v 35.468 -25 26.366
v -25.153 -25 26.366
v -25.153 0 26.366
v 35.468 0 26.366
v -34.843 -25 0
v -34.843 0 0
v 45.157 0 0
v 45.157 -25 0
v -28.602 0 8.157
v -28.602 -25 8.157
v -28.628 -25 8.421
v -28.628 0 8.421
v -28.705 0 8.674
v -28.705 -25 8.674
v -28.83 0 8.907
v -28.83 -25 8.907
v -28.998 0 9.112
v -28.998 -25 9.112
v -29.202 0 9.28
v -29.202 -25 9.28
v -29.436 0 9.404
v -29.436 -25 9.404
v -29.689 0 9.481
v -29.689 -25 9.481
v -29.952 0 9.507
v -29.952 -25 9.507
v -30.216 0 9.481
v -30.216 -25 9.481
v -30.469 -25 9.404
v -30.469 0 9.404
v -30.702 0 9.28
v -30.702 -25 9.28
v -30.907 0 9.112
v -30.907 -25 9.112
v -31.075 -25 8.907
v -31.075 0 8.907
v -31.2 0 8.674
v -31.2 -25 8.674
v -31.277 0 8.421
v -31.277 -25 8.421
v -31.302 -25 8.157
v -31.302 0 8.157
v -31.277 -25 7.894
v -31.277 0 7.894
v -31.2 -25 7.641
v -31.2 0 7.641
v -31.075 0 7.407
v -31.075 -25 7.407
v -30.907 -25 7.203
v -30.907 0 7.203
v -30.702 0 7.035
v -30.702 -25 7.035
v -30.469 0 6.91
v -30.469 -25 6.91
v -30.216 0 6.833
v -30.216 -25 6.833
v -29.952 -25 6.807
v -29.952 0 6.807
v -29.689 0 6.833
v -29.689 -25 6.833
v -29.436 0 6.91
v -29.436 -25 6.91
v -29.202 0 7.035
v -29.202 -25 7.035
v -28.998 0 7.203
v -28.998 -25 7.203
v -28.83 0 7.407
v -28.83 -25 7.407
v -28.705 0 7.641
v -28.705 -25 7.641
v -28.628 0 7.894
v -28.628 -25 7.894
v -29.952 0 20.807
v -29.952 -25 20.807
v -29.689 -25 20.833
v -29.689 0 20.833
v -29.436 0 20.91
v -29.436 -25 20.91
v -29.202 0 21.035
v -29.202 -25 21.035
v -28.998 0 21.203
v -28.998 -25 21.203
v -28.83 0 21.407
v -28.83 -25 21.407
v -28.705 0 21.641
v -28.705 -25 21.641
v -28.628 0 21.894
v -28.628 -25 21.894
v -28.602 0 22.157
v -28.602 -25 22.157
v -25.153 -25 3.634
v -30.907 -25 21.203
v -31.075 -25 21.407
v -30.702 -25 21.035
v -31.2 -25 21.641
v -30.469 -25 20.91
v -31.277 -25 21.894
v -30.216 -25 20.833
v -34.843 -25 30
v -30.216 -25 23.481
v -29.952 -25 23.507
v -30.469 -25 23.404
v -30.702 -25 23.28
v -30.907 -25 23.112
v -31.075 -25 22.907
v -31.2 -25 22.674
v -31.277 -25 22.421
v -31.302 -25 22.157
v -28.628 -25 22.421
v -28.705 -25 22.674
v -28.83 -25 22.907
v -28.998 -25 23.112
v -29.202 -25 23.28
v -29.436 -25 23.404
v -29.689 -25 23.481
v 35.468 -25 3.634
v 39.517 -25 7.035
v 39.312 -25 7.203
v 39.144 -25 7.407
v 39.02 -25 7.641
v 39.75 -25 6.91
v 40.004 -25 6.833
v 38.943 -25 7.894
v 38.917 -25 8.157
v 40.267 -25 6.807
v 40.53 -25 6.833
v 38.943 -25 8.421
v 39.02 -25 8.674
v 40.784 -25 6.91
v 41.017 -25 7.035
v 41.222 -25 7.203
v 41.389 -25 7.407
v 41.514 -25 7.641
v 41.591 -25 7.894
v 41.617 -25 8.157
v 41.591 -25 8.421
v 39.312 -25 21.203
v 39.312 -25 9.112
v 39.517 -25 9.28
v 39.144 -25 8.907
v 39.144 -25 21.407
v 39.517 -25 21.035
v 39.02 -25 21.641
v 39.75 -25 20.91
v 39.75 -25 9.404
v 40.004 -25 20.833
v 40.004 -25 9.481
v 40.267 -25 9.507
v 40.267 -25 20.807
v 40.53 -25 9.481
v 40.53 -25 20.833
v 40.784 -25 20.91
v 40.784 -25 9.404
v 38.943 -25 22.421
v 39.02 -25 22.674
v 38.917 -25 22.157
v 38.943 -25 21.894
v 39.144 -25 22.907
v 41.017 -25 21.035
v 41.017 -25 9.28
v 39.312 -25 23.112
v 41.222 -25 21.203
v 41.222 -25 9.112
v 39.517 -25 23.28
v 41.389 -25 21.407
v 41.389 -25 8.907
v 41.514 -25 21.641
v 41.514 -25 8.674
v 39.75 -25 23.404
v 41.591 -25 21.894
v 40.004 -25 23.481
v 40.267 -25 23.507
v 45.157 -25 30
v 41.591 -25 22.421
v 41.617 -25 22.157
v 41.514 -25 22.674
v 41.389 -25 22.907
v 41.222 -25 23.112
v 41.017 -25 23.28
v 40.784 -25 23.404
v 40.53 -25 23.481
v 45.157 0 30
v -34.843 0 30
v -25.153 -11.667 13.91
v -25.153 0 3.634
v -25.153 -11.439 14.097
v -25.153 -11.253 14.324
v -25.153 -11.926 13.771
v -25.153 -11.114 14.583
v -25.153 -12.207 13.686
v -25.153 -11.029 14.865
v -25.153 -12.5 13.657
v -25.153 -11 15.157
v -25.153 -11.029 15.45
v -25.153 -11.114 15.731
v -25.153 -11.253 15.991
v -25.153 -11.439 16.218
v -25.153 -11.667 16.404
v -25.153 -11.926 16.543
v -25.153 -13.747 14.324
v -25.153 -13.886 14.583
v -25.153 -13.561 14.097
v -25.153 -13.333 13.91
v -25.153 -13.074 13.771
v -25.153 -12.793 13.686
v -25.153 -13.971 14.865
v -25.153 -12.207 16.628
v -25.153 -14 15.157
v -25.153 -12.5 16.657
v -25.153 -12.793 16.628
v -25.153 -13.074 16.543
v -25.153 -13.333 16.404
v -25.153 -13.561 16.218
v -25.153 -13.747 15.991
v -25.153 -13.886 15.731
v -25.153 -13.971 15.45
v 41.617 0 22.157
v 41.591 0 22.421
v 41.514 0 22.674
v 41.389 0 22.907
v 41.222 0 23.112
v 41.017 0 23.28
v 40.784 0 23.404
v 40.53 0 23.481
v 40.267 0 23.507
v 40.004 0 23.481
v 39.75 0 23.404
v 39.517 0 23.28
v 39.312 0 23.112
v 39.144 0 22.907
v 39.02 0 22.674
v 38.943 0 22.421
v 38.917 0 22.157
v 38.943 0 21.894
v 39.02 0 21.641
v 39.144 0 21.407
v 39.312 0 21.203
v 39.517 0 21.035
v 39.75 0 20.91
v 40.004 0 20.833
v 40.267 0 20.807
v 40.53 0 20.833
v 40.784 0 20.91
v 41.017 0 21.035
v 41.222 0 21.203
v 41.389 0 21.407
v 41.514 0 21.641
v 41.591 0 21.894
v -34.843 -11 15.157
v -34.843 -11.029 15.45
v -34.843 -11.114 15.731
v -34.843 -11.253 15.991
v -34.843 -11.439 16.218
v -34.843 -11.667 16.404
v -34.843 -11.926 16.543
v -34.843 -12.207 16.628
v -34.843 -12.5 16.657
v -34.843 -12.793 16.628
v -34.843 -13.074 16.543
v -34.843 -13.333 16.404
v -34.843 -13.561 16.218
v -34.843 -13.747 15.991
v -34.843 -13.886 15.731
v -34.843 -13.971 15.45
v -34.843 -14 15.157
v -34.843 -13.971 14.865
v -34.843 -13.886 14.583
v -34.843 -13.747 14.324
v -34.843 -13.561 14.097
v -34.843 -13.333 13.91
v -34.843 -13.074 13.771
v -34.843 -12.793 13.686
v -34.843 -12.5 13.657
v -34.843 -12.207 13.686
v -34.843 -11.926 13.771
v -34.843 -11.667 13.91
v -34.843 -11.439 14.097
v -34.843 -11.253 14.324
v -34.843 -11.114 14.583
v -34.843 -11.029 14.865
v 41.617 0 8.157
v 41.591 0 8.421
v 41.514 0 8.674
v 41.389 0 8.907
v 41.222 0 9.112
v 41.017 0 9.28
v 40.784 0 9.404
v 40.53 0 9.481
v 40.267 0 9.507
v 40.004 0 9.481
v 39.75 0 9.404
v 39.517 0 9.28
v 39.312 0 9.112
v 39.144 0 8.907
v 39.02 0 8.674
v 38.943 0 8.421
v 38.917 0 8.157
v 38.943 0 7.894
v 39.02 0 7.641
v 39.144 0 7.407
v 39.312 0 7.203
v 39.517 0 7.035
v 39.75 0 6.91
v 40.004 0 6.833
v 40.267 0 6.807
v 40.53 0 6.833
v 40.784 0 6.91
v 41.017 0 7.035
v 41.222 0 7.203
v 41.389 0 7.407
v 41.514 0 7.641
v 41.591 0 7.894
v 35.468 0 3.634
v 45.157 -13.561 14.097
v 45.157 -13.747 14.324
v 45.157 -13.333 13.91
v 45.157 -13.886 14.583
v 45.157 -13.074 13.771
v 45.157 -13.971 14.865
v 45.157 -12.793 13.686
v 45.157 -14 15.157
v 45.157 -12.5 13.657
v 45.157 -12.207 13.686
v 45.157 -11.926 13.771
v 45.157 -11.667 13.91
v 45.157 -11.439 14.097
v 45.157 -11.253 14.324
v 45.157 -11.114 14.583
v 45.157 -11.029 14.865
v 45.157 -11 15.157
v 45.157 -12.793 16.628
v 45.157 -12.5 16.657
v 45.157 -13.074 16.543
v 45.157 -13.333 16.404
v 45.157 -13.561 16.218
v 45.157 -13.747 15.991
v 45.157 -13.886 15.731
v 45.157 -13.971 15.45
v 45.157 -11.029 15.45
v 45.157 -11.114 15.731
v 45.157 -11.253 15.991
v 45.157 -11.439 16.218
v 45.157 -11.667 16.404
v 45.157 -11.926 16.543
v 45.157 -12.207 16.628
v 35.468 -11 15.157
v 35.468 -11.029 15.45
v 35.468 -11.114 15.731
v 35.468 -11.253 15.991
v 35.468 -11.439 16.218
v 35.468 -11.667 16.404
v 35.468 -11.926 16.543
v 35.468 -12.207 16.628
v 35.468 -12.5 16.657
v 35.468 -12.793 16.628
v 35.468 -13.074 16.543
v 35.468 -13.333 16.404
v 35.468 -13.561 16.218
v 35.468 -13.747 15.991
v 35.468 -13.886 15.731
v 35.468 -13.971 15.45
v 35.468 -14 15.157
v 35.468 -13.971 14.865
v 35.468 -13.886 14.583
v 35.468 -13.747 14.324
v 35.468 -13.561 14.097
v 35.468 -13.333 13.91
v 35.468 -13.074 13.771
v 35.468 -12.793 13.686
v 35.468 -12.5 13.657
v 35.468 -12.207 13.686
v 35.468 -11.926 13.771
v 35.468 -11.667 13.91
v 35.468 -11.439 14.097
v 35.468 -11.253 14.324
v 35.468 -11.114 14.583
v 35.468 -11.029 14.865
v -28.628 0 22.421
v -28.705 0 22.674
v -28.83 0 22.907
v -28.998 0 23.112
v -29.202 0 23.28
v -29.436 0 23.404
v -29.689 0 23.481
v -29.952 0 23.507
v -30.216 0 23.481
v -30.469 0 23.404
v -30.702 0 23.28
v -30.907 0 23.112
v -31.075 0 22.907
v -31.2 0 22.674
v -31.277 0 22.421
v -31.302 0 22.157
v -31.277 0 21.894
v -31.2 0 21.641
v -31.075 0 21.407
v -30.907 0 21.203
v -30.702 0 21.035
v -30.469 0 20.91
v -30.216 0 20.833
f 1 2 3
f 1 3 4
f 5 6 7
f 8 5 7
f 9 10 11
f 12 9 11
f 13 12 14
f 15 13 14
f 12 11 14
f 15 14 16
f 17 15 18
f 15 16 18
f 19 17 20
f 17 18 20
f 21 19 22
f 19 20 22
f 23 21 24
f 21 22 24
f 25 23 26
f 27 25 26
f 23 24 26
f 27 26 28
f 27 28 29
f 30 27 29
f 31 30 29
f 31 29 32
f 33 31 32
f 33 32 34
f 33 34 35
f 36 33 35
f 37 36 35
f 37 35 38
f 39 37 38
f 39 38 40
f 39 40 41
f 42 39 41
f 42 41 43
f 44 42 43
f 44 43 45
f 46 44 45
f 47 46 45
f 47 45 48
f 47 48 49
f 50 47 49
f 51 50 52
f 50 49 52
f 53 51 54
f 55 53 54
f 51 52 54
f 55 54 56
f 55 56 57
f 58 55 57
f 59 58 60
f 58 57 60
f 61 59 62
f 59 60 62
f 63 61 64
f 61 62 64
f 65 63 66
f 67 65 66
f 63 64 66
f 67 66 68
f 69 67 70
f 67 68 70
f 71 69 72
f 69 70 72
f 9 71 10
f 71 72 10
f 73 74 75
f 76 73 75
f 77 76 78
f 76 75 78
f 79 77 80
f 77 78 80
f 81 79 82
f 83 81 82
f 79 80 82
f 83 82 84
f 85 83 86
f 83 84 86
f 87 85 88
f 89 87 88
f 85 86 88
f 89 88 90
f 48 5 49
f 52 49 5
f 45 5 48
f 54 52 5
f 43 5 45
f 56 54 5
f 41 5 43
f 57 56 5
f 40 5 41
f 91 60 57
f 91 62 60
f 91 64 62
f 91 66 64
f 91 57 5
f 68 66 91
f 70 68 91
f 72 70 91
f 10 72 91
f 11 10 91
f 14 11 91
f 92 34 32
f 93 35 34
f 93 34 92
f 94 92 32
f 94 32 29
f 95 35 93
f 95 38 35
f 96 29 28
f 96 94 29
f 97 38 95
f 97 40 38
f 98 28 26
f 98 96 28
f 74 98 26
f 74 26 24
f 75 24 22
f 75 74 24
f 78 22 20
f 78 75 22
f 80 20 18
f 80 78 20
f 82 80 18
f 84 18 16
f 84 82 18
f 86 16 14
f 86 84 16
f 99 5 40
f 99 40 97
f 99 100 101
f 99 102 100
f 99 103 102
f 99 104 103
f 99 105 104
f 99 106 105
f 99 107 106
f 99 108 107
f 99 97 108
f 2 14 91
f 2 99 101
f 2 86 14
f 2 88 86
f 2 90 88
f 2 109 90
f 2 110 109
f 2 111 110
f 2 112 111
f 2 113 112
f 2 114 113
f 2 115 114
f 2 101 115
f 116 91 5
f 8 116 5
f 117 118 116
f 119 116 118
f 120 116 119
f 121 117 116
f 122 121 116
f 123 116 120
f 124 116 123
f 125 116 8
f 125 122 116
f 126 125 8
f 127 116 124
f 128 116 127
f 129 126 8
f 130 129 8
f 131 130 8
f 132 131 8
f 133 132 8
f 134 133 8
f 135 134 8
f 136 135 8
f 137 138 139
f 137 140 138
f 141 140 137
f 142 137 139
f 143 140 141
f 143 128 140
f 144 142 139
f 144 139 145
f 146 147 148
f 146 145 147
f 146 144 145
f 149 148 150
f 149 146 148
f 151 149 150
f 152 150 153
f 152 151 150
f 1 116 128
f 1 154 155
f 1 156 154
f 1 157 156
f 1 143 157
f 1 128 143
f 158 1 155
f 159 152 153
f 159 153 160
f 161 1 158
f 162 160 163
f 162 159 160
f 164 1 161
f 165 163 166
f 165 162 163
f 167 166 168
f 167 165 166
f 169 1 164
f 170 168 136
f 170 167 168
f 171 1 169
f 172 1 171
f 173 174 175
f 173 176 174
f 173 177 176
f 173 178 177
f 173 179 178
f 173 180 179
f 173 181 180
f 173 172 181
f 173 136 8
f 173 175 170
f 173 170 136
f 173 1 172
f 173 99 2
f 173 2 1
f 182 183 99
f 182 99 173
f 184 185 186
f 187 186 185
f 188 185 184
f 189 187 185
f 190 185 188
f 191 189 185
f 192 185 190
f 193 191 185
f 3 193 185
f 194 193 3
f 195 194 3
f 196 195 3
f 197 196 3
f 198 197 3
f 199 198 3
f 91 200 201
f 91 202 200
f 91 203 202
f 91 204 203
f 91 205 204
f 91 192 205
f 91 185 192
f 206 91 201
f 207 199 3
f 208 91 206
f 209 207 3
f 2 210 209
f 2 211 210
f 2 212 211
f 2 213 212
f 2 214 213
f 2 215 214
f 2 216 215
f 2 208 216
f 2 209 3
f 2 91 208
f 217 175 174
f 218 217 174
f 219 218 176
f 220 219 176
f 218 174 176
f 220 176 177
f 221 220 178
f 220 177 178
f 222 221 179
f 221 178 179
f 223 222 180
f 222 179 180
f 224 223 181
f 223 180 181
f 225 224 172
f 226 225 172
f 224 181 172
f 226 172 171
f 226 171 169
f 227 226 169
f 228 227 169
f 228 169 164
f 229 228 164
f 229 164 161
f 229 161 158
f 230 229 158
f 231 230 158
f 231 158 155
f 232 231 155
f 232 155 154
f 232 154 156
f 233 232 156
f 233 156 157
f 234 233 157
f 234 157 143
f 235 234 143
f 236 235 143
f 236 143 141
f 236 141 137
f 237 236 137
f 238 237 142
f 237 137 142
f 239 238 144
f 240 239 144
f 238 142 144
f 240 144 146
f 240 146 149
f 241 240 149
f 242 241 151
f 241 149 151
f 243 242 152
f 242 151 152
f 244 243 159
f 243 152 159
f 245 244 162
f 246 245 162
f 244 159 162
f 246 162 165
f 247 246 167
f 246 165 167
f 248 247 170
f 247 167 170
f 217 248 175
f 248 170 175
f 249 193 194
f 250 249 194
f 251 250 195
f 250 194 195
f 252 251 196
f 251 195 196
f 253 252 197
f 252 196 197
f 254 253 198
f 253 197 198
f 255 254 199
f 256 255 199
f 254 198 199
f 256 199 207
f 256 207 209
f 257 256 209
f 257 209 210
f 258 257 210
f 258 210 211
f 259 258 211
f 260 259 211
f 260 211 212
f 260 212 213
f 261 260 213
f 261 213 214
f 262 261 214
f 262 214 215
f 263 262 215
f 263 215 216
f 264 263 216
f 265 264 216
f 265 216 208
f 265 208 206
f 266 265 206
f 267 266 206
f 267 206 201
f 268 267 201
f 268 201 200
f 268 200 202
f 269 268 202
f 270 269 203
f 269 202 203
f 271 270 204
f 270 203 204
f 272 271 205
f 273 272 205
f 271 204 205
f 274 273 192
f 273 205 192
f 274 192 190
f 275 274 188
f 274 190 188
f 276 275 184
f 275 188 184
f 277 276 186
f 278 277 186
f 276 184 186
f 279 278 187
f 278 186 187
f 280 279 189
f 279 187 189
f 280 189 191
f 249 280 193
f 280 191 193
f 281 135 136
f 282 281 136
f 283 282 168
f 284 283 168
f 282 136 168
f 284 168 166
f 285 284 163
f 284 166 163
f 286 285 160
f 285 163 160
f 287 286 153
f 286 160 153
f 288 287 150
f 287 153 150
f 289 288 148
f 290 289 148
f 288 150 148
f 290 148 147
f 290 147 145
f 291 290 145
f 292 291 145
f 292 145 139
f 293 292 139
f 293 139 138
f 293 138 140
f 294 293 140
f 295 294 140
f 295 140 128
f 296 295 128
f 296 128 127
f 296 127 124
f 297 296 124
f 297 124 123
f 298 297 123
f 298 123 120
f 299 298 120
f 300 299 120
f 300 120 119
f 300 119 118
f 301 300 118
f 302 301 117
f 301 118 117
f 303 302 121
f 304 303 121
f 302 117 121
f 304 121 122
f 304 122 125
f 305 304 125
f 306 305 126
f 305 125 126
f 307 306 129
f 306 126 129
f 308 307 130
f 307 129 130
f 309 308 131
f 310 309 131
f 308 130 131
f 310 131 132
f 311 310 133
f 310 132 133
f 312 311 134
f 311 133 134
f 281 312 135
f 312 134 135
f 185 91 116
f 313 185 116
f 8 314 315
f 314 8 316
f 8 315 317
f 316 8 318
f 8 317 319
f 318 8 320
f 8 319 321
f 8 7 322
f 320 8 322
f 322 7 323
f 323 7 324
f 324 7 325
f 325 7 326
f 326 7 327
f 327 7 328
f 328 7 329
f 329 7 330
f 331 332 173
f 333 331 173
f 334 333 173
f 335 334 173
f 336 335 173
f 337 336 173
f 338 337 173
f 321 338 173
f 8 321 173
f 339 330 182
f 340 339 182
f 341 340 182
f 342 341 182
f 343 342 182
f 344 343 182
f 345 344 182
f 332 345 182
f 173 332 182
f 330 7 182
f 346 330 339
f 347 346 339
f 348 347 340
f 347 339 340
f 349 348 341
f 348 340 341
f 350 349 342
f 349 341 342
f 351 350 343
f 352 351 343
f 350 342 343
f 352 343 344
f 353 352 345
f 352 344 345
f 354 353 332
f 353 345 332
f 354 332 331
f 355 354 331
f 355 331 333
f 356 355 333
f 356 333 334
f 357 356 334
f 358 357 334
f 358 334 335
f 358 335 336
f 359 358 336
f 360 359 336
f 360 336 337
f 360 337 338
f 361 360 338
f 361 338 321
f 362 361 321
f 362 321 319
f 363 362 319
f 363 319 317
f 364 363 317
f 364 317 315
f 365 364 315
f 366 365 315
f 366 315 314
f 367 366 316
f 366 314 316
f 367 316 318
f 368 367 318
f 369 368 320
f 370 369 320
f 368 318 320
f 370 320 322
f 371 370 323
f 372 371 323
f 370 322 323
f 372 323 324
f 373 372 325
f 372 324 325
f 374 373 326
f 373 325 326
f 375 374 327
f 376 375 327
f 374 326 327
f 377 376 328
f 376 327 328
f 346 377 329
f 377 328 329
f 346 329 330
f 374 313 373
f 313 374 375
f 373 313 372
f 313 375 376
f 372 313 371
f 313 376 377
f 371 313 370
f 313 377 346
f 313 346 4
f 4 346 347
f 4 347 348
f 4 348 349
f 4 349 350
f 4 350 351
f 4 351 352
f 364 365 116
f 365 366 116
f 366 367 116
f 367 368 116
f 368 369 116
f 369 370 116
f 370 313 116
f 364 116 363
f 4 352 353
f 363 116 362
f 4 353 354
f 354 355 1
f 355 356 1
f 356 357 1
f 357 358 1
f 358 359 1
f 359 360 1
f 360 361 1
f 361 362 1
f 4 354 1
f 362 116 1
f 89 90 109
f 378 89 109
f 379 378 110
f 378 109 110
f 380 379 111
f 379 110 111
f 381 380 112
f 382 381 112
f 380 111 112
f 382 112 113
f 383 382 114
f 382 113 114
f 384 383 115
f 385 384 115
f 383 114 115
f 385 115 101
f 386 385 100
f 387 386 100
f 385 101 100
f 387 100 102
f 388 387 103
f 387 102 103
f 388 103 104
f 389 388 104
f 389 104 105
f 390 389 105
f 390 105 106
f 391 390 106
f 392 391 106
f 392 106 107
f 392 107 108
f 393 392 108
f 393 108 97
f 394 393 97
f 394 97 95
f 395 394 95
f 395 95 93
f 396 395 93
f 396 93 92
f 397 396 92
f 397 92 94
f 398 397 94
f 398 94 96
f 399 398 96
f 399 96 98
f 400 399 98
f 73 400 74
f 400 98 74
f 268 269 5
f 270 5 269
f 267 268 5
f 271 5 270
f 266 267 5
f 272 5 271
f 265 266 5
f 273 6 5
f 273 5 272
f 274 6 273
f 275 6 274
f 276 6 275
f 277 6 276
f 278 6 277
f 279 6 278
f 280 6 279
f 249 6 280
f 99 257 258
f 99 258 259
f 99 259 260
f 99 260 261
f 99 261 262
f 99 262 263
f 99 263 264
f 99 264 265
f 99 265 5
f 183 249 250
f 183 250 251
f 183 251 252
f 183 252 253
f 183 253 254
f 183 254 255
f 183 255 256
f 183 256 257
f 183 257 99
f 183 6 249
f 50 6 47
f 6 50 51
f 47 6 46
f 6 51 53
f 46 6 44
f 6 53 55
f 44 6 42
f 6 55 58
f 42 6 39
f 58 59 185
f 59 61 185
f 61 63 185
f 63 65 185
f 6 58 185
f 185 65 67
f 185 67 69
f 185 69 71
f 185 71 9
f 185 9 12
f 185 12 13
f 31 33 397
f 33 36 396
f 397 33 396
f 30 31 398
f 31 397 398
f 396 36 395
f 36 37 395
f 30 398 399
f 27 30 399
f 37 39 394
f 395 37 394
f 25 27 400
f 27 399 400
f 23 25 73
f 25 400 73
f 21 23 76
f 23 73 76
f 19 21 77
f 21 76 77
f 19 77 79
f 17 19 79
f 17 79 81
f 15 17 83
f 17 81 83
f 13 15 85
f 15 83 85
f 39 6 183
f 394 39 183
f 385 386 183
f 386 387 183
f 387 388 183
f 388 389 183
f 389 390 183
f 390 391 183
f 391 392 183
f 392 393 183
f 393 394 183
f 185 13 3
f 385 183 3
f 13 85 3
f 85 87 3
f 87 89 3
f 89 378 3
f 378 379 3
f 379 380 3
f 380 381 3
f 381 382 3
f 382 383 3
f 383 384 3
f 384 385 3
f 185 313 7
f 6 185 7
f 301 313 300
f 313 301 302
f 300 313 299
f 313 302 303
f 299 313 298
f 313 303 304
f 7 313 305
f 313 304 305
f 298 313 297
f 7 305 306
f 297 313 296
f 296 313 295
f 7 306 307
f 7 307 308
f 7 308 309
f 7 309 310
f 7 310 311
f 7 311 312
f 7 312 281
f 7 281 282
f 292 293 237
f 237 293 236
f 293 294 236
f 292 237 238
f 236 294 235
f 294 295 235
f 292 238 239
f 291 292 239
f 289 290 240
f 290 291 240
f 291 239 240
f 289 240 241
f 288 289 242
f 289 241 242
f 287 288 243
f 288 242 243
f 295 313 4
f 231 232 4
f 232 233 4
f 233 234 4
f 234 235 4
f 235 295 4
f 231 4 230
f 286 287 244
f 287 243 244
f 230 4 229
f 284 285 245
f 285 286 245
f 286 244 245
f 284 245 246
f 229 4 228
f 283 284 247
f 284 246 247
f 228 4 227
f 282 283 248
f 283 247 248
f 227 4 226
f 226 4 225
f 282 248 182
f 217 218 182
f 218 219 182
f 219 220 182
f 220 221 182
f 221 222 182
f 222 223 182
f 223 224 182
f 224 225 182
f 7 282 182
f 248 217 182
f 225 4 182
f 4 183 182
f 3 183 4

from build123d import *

# Parameters (mm, degrees)
F0_W      = 80
F0_H      = 30
F1_DEPTH  = 25
F3_DEPTH  = 20
F4_R      = 1.5
F5_DEPTH  = 1000
F3_FACE_W = 60.621056
F3_FACE_H = 22.732896
F6_DEPTH  = 25
F7_R      = 1.35
F7_R_2    = 1
F8_DEPTH  = 100000


with BuildPart() as f1:
    # F0 (on Front) → F1 (new body)
    with BuildSketch(Plane.XZ):
        with Locations((5.157232, 15)):
            Rectangle(F0_W, F0_H)
    extrude(amount=F1_DEPTH)

    # F2 (on face) → F3 (cut)
    with BuildSketch(Plane.XZ.offset(25)):
        Polygon((35.46776, 26.366448), (-25.153296, 26.366448), (5.157232, 15), align=None)
        Polygon((5.157232, 15), (-25.153296, 26.366448), (-25.153296, 3.633552), align=None)
        Polygon((35.46776, 26.366448), (5.157232, 15), (35.46776, 3.633552), align=None)
        Polygon((35.46776, 3.633552), (5.157232, 15), (-25.153296, 3.633552), align=None)
    extrude(amount=-F3_DEPTH, mode=Mode.SUBTRACT)

    # F4 (on face) → F5 (cut)
    with BuildSketch(Plane.YZ.offset(45.157232)):
        with Locations((-12.5, 15.157233)):
            Circle(F4_R)
    extrude(amount=-F5_DEPTH, mode=Mode.SUBTRACT)

    # F3_face (on face) → F6 (cut)
    with BuildSketch(Plane(origin=(5.157232, -5, 15), x_dir=(1, 0, 0), z_dir=(0, -1, 0))):
        Rectangle(F3_FACE_W, F3_FACE_H)
    extrude(amount=-F6_DEPTH, mode=Mode.SUBTRACT)

    # F7 (on face) → F8 (cut)
    with BuildSketch(Plane.XZ.offset(25)):
        with BuildLine():
            ThreePointArc((-29.95245, 20.807233), (-28.997856, 21.202639), (-28.60245, 22.157233))
            ThreePointArc((-28.60245, 22.157233), (-30.907045, 23.111827), (-29.95245, 20.807233))
        make_face()
        with Locations((-29.95245, 8.157233)):
            Circle(F7_R)
        with Locations((40.266914, 8.157233)):
            Circle(F7_R)
        with Locations((40.266914, 22.157233)):
            Circle(F7_R)
        with Locations((-12.661189, -18.048356)):
            Circle(F7_R_2)
    extrude(amount=-F8_DEPTH, mode=Mode.SUBTRACT)


solid = f1.part
